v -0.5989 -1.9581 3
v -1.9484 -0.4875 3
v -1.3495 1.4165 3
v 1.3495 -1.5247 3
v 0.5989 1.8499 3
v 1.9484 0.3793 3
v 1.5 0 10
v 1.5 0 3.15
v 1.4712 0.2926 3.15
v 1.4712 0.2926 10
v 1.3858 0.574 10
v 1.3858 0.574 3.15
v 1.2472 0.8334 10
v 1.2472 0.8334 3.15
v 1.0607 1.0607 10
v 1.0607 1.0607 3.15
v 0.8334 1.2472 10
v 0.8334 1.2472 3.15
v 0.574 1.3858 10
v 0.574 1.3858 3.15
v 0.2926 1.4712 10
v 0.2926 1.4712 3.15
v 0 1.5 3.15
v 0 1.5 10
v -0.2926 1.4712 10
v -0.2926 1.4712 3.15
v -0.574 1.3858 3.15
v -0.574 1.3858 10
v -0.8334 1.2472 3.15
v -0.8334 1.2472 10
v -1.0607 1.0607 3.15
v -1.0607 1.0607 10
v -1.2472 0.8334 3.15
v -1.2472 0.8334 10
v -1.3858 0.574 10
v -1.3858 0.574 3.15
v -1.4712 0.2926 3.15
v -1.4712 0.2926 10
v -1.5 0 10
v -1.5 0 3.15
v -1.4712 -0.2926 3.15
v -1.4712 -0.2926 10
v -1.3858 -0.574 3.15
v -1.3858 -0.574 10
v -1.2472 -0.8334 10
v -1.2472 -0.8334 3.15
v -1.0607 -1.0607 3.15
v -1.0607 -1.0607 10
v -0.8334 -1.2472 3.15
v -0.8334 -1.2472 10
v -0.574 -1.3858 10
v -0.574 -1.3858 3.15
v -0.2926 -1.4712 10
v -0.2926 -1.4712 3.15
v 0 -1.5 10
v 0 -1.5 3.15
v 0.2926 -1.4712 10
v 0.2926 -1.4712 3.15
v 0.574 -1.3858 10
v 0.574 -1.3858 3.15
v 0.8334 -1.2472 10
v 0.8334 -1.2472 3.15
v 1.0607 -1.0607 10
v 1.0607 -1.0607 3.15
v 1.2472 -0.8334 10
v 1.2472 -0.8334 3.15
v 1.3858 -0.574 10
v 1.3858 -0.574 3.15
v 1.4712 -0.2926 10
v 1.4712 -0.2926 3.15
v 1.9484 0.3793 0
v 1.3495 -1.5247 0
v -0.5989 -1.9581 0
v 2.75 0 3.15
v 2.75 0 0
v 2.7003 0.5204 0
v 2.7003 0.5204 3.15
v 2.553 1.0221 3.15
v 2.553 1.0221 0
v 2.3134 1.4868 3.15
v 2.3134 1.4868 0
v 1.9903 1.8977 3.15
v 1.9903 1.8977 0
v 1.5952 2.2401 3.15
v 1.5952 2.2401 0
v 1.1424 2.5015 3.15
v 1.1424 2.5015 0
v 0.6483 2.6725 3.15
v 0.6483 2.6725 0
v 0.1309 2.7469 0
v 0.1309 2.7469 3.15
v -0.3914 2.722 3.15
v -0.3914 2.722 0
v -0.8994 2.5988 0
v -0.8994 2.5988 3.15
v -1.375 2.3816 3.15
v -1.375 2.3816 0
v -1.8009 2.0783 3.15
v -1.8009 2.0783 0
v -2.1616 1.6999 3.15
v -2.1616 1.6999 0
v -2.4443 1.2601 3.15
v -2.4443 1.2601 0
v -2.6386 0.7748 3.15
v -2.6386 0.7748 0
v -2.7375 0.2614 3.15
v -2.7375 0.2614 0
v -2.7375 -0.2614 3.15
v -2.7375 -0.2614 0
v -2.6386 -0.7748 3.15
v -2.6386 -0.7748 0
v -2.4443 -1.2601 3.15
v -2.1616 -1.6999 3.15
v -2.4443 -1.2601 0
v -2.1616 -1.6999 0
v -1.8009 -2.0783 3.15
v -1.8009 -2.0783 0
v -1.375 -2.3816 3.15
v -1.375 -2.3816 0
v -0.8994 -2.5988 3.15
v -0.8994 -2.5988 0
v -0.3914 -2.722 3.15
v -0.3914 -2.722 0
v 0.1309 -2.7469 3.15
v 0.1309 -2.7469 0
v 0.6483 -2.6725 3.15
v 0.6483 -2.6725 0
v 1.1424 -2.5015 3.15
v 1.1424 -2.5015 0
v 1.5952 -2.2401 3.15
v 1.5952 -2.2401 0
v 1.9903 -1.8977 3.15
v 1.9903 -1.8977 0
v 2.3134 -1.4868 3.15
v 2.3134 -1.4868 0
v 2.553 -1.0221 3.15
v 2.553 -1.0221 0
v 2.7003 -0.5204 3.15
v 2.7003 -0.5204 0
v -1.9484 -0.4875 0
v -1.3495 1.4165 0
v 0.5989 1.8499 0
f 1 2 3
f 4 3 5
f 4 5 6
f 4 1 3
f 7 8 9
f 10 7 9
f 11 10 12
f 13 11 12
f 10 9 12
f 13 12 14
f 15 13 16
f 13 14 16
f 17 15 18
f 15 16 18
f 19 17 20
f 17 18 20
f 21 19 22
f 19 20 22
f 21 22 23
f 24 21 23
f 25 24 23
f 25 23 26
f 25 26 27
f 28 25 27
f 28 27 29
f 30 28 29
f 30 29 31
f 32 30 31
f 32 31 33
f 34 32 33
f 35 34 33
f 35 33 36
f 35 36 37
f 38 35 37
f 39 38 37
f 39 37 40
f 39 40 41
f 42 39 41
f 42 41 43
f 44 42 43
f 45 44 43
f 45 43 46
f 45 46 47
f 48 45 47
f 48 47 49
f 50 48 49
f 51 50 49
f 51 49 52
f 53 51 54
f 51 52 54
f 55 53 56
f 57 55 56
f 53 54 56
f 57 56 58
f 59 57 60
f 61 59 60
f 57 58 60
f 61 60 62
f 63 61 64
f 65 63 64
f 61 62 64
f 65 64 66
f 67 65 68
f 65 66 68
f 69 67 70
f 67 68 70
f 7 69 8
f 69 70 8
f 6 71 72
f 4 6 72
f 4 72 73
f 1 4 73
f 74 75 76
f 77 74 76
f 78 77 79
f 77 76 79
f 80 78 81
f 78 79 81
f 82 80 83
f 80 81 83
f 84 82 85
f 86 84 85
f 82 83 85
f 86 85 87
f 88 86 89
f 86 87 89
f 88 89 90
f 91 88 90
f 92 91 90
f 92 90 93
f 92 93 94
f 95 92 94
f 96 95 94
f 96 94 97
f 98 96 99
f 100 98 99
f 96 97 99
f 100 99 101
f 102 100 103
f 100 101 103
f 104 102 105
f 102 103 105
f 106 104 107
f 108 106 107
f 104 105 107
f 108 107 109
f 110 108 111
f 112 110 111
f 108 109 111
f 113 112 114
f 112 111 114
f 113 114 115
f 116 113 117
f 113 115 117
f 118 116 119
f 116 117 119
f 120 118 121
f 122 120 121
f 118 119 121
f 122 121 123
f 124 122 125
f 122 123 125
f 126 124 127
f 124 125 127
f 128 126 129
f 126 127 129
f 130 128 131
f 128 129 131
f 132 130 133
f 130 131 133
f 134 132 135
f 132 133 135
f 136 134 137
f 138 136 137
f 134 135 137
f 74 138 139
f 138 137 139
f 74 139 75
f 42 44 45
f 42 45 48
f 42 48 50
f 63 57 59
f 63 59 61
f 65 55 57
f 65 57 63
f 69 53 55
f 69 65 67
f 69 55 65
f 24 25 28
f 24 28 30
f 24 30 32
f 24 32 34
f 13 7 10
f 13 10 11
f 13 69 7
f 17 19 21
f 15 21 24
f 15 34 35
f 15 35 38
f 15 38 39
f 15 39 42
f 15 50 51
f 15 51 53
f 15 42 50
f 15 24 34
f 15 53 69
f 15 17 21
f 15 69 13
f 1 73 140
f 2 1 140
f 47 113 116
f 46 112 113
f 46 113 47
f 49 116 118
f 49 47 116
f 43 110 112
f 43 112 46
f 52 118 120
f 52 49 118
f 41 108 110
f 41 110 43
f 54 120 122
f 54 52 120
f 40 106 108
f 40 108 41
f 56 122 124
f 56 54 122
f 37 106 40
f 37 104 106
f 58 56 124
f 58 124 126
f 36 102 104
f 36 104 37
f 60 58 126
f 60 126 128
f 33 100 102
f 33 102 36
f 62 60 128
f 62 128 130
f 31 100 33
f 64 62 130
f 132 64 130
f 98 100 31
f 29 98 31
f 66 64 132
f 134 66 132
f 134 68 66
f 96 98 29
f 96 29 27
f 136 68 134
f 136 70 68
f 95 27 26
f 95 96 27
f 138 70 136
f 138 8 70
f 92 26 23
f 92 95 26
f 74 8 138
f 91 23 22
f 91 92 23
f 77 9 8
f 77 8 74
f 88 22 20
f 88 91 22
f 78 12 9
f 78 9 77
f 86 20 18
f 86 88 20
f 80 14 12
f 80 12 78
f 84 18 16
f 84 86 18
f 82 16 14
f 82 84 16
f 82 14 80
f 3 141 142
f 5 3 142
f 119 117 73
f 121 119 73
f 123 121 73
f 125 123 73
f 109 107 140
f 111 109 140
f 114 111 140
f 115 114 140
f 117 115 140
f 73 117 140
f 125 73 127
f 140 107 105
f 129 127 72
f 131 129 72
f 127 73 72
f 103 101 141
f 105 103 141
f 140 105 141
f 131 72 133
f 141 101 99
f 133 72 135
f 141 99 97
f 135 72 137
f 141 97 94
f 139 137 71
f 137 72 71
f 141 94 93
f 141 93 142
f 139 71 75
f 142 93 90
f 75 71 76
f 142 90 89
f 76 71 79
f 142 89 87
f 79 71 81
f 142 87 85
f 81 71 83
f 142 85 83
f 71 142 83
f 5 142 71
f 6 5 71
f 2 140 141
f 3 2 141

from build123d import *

# Parameters (mm, degrees)
F0_R     = 2.75
F0_R_2   = 1.5
F1_DEPTH = 3.15
F2_DEPTH = 10
F4_DEPTH = 3


with BuildPart() as f1:
    # F0 (on Top) → F1 (new body)
    with BuildSketch(Plane.XY):
        Circle(F0_R)
        Circle(F0_R_2, mode=Mode.SUBTRACT)
    extrude(amount=F1_DEPTH)

    # F0 (on Top) → F2 (join)
    with BuildSketch(Plane.XY):
        Circle(F0_R_2)
    extrude(amount=F2_DEPTH)

    # F3 (on face) → F4 (cut)
    with BuildSketch(Plane(origin=(0, 0, 0), x_dir=(1, 0, 0), z_dir=(0, 0, -1))):
        Polygon((1.349507, 1.524745), (-0.598857, 1.958133), (-1.948365, 0.487494), (-1.349507, -1.416534), (0.598857, -1.849922), (1.948365, -0.379282), align=None)
    extrude(amount=-F4_DEPTH, mode=Mode.SUBTRACT)


solid = f1.part
